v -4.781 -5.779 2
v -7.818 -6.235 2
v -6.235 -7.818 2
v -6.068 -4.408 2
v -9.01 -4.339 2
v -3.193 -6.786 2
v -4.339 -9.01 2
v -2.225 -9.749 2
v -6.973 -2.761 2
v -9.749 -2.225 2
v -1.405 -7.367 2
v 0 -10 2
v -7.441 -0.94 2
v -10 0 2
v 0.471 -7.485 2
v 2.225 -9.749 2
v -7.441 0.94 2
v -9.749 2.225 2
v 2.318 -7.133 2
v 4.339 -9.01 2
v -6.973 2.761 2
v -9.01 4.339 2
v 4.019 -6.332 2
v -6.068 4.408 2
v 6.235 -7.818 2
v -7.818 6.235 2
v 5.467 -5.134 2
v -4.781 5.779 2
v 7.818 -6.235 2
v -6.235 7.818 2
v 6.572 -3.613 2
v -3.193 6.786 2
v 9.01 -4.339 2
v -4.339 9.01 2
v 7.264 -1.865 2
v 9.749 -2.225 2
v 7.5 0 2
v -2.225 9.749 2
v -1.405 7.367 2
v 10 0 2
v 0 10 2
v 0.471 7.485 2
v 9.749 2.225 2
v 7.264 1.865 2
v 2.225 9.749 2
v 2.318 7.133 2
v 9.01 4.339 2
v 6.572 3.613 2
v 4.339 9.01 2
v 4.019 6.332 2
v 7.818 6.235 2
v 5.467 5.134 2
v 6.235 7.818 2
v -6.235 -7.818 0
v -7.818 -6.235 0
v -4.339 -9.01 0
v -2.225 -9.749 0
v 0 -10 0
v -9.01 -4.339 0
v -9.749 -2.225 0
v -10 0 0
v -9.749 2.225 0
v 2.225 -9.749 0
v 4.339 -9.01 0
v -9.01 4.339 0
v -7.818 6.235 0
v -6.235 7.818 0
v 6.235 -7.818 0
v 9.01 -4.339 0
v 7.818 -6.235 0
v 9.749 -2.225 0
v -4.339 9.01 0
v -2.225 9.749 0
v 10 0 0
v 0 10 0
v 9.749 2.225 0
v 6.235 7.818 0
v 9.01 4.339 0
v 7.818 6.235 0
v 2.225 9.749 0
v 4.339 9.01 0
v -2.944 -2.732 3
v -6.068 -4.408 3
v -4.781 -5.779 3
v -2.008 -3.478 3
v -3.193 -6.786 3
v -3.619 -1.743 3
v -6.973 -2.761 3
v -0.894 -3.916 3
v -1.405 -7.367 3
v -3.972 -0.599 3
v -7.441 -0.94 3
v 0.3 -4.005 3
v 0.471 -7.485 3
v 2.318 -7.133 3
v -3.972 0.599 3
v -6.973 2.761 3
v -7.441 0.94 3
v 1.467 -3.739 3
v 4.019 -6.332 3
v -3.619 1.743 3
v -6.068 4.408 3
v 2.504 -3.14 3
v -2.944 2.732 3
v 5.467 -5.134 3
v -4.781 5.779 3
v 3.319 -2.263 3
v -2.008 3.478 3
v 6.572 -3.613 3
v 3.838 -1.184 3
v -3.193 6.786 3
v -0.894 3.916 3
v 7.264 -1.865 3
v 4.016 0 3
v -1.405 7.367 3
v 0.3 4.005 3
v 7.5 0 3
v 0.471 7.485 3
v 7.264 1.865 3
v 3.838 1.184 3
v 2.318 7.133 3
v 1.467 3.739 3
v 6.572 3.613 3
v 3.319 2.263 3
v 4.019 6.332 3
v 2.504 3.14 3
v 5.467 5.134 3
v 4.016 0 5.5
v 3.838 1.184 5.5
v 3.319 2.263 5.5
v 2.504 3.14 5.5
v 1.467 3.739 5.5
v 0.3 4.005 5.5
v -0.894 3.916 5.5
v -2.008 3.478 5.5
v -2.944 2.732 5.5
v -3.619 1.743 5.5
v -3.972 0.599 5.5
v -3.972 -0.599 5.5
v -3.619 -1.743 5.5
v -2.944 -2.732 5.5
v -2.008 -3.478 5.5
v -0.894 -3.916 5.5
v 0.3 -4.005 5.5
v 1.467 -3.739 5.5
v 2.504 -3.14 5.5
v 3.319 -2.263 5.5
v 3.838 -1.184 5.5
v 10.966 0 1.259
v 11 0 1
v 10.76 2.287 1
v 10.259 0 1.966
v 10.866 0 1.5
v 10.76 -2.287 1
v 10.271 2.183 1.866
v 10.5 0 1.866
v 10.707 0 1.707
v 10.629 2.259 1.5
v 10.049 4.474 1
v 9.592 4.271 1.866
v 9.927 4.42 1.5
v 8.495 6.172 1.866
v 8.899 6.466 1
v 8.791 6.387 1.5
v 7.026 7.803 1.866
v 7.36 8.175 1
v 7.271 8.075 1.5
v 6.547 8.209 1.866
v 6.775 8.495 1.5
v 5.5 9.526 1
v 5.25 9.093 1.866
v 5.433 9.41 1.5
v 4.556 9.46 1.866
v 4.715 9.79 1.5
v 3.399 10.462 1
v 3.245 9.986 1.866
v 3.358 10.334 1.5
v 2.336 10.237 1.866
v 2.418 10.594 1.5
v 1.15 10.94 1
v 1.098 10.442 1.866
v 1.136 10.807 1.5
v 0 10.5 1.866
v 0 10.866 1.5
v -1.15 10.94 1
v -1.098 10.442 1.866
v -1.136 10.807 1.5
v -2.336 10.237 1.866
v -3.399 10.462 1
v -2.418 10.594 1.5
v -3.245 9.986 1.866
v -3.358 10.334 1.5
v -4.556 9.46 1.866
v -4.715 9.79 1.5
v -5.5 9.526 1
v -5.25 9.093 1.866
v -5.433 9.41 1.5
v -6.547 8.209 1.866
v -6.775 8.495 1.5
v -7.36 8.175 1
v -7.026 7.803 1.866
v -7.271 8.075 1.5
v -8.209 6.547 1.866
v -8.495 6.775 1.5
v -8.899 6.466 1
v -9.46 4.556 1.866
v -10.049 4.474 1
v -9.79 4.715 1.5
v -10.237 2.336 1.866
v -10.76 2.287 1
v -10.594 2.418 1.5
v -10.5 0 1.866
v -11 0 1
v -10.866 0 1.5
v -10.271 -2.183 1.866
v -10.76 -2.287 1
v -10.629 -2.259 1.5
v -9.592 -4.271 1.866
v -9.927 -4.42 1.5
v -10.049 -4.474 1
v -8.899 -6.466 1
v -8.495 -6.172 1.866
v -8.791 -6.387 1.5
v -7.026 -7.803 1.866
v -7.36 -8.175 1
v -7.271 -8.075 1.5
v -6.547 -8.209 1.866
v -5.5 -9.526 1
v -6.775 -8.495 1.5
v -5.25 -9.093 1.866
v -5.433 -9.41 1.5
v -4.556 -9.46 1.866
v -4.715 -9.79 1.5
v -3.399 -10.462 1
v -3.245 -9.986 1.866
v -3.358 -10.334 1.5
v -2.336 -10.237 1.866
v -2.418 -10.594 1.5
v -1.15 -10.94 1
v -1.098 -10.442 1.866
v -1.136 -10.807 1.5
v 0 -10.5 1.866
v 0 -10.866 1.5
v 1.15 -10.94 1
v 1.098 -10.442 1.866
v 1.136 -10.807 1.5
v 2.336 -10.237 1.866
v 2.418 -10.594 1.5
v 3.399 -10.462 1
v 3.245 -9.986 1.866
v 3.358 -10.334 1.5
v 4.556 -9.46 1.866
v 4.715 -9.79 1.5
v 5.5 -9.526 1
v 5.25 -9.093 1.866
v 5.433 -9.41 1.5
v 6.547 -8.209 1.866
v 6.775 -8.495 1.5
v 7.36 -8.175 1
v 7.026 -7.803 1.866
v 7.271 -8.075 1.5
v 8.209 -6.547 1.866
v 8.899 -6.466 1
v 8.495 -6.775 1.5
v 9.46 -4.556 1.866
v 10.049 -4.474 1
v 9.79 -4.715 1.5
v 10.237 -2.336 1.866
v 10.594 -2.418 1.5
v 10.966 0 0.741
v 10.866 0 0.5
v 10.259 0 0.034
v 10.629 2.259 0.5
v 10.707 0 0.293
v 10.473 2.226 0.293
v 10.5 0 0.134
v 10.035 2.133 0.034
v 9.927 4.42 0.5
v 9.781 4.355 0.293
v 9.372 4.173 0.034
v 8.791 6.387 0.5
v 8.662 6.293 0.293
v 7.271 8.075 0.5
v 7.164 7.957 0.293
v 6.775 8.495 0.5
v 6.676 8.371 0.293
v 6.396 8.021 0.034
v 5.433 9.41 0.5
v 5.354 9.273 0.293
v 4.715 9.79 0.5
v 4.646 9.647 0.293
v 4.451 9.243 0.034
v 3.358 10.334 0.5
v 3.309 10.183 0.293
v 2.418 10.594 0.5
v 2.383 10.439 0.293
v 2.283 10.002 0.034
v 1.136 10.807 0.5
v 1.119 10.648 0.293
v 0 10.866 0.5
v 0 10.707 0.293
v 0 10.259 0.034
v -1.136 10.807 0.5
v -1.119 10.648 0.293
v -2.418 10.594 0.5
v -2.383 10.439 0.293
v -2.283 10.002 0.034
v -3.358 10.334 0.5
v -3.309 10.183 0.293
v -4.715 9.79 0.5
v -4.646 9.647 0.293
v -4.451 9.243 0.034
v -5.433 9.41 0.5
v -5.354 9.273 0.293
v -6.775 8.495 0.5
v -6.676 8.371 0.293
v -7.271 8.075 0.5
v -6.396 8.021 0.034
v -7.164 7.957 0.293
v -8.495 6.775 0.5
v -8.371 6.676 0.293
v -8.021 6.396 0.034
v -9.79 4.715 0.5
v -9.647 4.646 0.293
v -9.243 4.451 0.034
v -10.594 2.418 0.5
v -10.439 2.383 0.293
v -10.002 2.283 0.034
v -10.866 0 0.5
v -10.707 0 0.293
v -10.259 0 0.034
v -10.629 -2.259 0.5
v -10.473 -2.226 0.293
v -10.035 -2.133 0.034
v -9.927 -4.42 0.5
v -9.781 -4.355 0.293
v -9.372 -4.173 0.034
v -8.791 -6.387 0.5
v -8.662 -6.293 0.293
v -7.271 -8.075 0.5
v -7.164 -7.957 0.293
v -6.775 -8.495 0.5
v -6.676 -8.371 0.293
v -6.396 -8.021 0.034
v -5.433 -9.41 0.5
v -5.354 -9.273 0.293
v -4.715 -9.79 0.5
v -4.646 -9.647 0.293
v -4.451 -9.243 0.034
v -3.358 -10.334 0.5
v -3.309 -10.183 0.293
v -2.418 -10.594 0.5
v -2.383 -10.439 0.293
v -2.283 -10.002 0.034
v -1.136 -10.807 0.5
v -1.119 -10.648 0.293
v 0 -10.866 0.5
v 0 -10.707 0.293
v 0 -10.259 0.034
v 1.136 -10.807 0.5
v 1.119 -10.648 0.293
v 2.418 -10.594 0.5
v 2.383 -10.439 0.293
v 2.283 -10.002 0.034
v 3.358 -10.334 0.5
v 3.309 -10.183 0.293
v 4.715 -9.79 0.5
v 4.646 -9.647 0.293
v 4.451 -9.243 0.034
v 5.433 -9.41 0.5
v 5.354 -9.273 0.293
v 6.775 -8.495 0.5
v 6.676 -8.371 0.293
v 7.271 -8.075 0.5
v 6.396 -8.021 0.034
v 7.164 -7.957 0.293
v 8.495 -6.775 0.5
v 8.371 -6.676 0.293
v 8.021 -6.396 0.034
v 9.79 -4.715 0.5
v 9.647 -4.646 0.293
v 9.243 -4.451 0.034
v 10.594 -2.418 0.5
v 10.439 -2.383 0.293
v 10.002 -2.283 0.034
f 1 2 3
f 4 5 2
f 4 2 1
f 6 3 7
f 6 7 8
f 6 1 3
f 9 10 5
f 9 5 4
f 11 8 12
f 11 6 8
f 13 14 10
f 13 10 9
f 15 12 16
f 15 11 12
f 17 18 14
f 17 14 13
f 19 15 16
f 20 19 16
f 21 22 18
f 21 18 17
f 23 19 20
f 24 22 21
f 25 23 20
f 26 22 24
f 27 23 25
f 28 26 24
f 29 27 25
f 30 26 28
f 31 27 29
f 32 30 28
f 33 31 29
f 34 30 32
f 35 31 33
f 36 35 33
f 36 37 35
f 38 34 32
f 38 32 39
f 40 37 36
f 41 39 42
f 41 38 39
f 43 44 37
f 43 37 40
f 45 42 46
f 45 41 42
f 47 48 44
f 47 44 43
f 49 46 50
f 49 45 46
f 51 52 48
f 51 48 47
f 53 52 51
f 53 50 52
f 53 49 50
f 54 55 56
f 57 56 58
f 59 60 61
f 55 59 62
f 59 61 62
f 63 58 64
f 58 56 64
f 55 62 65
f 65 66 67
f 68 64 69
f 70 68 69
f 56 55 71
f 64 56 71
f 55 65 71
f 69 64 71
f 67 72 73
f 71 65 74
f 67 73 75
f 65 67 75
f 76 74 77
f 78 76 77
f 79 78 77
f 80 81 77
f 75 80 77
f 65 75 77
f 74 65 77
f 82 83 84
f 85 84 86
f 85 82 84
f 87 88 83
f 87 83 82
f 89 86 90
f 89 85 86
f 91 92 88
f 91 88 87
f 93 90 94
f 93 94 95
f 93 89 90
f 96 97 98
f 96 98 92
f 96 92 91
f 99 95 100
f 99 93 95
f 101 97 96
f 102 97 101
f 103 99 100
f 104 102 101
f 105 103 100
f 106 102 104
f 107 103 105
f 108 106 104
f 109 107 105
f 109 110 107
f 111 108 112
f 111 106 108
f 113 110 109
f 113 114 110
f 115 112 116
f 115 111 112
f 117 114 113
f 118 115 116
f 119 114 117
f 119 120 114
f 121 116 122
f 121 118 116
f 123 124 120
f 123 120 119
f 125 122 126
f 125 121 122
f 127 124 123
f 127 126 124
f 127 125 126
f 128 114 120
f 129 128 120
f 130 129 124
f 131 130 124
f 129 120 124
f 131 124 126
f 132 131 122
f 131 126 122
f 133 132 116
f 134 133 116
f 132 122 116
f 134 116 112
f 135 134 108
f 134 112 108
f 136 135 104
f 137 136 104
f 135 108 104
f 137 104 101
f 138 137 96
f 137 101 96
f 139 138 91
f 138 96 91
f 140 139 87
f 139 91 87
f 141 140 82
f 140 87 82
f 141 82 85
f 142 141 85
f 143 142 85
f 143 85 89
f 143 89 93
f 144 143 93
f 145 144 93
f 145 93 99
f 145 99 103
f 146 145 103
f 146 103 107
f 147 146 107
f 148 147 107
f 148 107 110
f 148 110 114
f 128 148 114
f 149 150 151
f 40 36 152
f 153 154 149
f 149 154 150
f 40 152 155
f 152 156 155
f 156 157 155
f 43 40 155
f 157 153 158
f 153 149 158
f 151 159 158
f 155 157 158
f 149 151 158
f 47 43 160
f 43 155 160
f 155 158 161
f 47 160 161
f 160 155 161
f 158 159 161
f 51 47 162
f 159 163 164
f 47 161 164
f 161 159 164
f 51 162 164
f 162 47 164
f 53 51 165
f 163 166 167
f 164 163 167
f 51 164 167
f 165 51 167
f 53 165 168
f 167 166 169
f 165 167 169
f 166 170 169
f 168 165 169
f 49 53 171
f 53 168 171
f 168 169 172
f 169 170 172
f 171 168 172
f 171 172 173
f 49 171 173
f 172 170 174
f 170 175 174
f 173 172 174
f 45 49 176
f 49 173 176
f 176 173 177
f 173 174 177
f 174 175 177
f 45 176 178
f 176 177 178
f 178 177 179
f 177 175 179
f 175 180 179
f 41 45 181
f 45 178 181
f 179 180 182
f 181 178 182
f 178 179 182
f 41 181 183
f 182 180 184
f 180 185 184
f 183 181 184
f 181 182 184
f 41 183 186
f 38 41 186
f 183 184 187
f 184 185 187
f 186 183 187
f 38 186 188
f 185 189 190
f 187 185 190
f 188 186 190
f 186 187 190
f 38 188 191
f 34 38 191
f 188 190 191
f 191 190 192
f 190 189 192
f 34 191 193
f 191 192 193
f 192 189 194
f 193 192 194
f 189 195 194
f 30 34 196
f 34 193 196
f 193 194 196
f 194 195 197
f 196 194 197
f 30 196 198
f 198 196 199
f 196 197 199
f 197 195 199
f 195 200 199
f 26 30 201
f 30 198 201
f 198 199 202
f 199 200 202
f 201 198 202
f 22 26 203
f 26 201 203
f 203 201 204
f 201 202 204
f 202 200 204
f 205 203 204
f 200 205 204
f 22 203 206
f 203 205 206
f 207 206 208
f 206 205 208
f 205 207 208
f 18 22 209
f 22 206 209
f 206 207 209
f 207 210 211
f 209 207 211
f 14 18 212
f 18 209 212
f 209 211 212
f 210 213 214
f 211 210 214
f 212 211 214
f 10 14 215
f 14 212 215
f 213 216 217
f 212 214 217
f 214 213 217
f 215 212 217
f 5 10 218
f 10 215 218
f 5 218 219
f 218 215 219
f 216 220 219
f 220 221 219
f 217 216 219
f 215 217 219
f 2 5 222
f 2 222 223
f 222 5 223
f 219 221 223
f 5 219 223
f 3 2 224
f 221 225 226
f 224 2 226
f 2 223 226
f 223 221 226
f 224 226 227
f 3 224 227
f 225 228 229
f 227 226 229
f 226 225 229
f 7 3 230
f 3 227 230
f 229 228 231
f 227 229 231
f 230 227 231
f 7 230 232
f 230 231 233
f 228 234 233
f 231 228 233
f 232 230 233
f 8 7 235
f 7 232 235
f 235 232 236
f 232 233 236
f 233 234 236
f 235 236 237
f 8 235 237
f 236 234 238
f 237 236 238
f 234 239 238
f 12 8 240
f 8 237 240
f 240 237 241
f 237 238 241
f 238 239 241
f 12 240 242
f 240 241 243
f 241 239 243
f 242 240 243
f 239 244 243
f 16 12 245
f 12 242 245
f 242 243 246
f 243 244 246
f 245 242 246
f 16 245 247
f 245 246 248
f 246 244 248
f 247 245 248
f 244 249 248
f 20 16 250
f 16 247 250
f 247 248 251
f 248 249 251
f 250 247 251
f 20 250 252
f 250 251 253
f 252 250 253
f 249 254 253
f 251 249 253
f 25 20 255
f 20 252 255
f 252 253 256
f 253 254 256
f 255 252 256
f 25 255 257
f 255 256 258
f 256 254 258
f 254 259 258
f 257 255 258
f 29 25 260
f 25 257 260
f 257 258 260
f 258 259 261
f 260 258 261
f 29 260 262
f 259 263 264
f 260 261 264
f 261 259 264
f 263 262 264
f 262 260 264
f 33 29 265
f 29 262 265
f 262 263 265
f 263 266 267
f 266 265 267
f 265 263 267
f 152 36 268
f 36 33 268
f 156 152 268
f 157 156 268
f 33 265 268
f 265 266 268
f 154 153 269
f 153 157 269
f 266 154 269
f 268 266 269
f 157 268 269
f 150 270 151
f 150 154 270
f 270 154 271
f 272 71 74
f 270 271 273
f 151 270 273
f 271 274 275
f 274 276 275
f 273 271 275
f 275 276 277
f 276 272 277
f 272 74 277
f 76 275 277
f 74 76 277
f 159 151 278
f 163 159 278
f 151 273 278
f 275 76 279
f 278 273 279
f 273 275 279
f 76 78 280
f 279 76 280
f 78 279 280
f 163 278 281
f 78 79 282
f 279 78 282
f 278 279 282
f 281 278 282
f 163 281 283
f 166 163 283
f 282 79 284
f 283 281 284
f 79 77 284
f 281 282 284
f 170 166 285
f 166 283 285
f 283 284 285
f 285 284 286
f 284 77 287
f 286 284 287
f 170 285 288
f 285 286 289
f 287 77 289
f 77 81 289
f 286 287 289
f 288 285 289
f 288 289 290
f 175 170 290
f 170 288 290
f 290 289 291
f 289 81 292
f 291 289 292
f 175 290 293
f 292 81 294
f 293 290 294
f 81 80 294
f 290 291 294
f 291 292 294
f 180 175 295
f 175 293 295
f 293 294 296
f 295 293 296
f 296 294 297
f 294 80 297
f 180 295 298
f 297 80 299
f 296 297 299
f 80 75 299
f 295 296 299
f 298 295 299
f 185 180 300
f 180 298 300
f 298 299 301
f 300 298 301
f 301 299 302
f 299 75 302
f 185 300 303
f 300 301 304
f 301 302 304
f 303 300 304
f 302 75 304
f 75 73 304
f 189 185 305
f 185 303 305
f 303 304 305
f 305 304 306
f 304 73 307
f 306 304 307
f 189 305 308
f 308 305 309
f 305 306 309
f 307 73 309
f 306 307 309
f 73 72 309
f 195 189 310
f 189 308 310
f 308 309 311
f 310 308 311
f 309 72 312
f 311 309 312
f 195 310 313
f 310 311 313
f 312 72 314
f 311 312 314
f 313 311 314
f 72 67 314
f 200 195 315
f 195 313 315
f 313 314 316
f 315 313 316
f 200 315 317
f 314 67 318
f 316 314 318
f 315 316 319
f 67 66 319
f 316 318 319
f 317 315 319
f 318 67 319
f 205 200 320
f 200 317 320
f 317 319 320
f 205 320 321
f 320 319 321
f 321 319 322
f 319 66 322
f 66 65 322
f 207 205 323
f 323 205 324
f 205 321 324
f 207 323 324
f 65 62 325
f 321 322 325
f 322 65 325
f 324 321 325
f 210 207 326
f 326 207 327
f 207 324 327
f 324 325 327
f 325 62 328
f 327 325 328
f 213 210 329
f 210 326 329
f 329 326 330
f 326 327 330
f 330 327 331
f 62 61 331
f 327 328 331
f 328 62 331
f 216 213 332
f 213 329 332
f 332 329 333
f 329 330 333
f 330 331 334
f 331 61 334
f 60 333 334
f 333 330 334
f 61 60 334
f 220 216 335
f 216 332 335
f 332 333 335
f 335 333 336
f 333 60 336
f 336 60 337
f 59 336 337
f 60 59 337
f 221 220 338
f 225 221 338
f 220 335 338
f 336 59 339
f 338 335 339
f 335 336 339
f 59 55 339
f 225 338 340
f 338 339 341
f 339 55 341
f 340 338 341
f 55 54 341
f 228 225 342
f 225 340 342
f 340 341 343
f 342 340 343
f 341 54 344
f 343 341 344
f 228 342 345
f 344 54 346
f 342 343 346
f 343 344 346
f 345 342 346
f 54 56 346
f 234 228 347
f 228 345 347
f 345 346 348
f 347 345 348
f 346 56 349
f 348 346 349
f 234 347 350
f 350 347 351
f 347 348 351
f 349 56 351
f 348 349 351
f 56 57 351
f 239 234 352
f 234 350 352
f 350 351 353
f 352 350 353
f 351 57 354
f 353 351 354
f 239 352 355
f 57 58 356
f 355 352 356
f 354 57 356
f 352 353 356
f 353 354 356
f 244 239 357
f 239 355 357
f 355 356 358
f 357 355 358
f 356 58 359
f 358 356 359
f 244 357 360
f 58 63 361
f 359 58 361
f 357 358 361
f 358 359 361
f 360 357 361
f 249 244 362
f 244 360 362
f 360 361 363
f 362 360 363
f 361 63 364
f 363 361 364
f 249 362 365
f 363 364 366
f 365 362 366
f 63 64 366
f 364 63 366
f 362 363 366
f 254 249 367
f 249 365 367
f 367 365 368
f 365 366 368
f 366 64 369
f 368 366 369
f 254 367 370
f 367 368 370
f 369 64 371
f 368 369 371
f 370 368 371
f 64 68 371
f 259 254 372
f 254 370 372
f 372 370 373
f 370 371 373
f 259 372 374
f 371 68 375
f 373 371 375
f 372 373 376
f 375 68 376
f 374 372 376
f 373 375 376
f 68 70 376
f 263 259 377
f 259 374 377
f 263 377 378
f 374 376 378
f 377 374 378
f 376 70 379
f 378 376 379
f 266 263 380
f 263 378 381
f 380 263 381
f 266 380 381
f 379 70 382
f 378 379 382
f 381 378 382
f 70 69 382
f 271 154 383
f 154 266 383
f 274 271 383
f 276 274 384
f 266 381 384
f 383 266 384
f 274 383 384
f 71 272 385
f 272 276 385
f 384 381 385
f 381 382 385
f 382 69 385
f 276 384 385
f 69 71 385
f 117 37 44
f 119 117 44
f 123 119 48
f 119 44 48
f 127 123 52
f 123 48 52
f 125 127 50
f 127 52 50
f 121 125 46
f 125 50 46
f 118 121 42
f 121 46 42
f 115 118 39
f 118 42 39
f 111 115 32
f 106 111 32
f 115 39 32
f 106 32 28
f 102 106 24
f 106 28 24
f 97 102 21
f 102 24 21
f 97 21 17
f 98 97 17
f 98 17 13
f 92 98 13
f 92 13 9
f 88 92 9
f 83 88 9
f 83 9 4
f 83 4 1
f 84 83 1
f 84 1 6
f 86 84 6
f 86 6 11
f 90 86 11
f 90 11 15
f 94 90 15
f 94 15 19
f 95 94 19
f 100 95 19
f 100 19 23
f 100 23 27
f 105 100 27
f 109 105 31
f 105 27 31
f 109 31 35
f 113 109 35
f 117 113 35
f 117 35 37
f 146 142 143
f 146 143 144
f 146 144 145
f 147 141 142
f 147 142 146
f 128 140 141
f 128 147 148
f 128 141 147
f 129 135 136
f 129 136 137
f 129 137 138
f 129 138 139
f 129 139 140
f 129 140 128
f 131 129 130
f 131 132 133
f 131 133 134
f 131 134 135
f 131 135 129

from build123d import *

# Parameters (mm, degrees)
F0_R     = 11
F0_R_2   = 7.5
F1_DEPTH = 2
F0_R_3   = 4.0165
F2_DEPTH = 3
F3_DEPTH = 5.5
F4_R     = 0.99999


# Not quite as in the source:
# - a fillet or chamfer is up to 0.001 mm smaller than in the source, because OpenCascade refuses the exact size


with BuildPart() as f1:
    # F0 (on Top) → F1 (new body)
    with BuildSketch(Plane.XY):
        Circle(F0_R)
        Circle(F0_R_2, mode=Mode.SUBTRACT)
    extrude(amount=F1_DEPTH)

    # F0 (on Top) → F2 (join)
    with BuildSketch(Plane.XY):
        Circle(F0_R_2)
        Circle(F0_R_3, mode=Mode.SUBTRACT)
    extrude(amount=F2_DEPTH)

    # F0 (on Top) → F3 (join)
    with BuildSketch(Plane.XY):
        Circle(F0_R_3)
    extrude(amount=F3_DEPTH)

    # F4 (radius 1 in the source; OpenCascade refuses exactly that, so slightly less here)
    f4_edges = [f1.edges().sort_by_distance(p)[0] for p in [
        (-11, 0, 2),
        (-11, 0, 0),
    ]]
    fillet(f4_edges, radius=F4_R)


solid = f1.part
